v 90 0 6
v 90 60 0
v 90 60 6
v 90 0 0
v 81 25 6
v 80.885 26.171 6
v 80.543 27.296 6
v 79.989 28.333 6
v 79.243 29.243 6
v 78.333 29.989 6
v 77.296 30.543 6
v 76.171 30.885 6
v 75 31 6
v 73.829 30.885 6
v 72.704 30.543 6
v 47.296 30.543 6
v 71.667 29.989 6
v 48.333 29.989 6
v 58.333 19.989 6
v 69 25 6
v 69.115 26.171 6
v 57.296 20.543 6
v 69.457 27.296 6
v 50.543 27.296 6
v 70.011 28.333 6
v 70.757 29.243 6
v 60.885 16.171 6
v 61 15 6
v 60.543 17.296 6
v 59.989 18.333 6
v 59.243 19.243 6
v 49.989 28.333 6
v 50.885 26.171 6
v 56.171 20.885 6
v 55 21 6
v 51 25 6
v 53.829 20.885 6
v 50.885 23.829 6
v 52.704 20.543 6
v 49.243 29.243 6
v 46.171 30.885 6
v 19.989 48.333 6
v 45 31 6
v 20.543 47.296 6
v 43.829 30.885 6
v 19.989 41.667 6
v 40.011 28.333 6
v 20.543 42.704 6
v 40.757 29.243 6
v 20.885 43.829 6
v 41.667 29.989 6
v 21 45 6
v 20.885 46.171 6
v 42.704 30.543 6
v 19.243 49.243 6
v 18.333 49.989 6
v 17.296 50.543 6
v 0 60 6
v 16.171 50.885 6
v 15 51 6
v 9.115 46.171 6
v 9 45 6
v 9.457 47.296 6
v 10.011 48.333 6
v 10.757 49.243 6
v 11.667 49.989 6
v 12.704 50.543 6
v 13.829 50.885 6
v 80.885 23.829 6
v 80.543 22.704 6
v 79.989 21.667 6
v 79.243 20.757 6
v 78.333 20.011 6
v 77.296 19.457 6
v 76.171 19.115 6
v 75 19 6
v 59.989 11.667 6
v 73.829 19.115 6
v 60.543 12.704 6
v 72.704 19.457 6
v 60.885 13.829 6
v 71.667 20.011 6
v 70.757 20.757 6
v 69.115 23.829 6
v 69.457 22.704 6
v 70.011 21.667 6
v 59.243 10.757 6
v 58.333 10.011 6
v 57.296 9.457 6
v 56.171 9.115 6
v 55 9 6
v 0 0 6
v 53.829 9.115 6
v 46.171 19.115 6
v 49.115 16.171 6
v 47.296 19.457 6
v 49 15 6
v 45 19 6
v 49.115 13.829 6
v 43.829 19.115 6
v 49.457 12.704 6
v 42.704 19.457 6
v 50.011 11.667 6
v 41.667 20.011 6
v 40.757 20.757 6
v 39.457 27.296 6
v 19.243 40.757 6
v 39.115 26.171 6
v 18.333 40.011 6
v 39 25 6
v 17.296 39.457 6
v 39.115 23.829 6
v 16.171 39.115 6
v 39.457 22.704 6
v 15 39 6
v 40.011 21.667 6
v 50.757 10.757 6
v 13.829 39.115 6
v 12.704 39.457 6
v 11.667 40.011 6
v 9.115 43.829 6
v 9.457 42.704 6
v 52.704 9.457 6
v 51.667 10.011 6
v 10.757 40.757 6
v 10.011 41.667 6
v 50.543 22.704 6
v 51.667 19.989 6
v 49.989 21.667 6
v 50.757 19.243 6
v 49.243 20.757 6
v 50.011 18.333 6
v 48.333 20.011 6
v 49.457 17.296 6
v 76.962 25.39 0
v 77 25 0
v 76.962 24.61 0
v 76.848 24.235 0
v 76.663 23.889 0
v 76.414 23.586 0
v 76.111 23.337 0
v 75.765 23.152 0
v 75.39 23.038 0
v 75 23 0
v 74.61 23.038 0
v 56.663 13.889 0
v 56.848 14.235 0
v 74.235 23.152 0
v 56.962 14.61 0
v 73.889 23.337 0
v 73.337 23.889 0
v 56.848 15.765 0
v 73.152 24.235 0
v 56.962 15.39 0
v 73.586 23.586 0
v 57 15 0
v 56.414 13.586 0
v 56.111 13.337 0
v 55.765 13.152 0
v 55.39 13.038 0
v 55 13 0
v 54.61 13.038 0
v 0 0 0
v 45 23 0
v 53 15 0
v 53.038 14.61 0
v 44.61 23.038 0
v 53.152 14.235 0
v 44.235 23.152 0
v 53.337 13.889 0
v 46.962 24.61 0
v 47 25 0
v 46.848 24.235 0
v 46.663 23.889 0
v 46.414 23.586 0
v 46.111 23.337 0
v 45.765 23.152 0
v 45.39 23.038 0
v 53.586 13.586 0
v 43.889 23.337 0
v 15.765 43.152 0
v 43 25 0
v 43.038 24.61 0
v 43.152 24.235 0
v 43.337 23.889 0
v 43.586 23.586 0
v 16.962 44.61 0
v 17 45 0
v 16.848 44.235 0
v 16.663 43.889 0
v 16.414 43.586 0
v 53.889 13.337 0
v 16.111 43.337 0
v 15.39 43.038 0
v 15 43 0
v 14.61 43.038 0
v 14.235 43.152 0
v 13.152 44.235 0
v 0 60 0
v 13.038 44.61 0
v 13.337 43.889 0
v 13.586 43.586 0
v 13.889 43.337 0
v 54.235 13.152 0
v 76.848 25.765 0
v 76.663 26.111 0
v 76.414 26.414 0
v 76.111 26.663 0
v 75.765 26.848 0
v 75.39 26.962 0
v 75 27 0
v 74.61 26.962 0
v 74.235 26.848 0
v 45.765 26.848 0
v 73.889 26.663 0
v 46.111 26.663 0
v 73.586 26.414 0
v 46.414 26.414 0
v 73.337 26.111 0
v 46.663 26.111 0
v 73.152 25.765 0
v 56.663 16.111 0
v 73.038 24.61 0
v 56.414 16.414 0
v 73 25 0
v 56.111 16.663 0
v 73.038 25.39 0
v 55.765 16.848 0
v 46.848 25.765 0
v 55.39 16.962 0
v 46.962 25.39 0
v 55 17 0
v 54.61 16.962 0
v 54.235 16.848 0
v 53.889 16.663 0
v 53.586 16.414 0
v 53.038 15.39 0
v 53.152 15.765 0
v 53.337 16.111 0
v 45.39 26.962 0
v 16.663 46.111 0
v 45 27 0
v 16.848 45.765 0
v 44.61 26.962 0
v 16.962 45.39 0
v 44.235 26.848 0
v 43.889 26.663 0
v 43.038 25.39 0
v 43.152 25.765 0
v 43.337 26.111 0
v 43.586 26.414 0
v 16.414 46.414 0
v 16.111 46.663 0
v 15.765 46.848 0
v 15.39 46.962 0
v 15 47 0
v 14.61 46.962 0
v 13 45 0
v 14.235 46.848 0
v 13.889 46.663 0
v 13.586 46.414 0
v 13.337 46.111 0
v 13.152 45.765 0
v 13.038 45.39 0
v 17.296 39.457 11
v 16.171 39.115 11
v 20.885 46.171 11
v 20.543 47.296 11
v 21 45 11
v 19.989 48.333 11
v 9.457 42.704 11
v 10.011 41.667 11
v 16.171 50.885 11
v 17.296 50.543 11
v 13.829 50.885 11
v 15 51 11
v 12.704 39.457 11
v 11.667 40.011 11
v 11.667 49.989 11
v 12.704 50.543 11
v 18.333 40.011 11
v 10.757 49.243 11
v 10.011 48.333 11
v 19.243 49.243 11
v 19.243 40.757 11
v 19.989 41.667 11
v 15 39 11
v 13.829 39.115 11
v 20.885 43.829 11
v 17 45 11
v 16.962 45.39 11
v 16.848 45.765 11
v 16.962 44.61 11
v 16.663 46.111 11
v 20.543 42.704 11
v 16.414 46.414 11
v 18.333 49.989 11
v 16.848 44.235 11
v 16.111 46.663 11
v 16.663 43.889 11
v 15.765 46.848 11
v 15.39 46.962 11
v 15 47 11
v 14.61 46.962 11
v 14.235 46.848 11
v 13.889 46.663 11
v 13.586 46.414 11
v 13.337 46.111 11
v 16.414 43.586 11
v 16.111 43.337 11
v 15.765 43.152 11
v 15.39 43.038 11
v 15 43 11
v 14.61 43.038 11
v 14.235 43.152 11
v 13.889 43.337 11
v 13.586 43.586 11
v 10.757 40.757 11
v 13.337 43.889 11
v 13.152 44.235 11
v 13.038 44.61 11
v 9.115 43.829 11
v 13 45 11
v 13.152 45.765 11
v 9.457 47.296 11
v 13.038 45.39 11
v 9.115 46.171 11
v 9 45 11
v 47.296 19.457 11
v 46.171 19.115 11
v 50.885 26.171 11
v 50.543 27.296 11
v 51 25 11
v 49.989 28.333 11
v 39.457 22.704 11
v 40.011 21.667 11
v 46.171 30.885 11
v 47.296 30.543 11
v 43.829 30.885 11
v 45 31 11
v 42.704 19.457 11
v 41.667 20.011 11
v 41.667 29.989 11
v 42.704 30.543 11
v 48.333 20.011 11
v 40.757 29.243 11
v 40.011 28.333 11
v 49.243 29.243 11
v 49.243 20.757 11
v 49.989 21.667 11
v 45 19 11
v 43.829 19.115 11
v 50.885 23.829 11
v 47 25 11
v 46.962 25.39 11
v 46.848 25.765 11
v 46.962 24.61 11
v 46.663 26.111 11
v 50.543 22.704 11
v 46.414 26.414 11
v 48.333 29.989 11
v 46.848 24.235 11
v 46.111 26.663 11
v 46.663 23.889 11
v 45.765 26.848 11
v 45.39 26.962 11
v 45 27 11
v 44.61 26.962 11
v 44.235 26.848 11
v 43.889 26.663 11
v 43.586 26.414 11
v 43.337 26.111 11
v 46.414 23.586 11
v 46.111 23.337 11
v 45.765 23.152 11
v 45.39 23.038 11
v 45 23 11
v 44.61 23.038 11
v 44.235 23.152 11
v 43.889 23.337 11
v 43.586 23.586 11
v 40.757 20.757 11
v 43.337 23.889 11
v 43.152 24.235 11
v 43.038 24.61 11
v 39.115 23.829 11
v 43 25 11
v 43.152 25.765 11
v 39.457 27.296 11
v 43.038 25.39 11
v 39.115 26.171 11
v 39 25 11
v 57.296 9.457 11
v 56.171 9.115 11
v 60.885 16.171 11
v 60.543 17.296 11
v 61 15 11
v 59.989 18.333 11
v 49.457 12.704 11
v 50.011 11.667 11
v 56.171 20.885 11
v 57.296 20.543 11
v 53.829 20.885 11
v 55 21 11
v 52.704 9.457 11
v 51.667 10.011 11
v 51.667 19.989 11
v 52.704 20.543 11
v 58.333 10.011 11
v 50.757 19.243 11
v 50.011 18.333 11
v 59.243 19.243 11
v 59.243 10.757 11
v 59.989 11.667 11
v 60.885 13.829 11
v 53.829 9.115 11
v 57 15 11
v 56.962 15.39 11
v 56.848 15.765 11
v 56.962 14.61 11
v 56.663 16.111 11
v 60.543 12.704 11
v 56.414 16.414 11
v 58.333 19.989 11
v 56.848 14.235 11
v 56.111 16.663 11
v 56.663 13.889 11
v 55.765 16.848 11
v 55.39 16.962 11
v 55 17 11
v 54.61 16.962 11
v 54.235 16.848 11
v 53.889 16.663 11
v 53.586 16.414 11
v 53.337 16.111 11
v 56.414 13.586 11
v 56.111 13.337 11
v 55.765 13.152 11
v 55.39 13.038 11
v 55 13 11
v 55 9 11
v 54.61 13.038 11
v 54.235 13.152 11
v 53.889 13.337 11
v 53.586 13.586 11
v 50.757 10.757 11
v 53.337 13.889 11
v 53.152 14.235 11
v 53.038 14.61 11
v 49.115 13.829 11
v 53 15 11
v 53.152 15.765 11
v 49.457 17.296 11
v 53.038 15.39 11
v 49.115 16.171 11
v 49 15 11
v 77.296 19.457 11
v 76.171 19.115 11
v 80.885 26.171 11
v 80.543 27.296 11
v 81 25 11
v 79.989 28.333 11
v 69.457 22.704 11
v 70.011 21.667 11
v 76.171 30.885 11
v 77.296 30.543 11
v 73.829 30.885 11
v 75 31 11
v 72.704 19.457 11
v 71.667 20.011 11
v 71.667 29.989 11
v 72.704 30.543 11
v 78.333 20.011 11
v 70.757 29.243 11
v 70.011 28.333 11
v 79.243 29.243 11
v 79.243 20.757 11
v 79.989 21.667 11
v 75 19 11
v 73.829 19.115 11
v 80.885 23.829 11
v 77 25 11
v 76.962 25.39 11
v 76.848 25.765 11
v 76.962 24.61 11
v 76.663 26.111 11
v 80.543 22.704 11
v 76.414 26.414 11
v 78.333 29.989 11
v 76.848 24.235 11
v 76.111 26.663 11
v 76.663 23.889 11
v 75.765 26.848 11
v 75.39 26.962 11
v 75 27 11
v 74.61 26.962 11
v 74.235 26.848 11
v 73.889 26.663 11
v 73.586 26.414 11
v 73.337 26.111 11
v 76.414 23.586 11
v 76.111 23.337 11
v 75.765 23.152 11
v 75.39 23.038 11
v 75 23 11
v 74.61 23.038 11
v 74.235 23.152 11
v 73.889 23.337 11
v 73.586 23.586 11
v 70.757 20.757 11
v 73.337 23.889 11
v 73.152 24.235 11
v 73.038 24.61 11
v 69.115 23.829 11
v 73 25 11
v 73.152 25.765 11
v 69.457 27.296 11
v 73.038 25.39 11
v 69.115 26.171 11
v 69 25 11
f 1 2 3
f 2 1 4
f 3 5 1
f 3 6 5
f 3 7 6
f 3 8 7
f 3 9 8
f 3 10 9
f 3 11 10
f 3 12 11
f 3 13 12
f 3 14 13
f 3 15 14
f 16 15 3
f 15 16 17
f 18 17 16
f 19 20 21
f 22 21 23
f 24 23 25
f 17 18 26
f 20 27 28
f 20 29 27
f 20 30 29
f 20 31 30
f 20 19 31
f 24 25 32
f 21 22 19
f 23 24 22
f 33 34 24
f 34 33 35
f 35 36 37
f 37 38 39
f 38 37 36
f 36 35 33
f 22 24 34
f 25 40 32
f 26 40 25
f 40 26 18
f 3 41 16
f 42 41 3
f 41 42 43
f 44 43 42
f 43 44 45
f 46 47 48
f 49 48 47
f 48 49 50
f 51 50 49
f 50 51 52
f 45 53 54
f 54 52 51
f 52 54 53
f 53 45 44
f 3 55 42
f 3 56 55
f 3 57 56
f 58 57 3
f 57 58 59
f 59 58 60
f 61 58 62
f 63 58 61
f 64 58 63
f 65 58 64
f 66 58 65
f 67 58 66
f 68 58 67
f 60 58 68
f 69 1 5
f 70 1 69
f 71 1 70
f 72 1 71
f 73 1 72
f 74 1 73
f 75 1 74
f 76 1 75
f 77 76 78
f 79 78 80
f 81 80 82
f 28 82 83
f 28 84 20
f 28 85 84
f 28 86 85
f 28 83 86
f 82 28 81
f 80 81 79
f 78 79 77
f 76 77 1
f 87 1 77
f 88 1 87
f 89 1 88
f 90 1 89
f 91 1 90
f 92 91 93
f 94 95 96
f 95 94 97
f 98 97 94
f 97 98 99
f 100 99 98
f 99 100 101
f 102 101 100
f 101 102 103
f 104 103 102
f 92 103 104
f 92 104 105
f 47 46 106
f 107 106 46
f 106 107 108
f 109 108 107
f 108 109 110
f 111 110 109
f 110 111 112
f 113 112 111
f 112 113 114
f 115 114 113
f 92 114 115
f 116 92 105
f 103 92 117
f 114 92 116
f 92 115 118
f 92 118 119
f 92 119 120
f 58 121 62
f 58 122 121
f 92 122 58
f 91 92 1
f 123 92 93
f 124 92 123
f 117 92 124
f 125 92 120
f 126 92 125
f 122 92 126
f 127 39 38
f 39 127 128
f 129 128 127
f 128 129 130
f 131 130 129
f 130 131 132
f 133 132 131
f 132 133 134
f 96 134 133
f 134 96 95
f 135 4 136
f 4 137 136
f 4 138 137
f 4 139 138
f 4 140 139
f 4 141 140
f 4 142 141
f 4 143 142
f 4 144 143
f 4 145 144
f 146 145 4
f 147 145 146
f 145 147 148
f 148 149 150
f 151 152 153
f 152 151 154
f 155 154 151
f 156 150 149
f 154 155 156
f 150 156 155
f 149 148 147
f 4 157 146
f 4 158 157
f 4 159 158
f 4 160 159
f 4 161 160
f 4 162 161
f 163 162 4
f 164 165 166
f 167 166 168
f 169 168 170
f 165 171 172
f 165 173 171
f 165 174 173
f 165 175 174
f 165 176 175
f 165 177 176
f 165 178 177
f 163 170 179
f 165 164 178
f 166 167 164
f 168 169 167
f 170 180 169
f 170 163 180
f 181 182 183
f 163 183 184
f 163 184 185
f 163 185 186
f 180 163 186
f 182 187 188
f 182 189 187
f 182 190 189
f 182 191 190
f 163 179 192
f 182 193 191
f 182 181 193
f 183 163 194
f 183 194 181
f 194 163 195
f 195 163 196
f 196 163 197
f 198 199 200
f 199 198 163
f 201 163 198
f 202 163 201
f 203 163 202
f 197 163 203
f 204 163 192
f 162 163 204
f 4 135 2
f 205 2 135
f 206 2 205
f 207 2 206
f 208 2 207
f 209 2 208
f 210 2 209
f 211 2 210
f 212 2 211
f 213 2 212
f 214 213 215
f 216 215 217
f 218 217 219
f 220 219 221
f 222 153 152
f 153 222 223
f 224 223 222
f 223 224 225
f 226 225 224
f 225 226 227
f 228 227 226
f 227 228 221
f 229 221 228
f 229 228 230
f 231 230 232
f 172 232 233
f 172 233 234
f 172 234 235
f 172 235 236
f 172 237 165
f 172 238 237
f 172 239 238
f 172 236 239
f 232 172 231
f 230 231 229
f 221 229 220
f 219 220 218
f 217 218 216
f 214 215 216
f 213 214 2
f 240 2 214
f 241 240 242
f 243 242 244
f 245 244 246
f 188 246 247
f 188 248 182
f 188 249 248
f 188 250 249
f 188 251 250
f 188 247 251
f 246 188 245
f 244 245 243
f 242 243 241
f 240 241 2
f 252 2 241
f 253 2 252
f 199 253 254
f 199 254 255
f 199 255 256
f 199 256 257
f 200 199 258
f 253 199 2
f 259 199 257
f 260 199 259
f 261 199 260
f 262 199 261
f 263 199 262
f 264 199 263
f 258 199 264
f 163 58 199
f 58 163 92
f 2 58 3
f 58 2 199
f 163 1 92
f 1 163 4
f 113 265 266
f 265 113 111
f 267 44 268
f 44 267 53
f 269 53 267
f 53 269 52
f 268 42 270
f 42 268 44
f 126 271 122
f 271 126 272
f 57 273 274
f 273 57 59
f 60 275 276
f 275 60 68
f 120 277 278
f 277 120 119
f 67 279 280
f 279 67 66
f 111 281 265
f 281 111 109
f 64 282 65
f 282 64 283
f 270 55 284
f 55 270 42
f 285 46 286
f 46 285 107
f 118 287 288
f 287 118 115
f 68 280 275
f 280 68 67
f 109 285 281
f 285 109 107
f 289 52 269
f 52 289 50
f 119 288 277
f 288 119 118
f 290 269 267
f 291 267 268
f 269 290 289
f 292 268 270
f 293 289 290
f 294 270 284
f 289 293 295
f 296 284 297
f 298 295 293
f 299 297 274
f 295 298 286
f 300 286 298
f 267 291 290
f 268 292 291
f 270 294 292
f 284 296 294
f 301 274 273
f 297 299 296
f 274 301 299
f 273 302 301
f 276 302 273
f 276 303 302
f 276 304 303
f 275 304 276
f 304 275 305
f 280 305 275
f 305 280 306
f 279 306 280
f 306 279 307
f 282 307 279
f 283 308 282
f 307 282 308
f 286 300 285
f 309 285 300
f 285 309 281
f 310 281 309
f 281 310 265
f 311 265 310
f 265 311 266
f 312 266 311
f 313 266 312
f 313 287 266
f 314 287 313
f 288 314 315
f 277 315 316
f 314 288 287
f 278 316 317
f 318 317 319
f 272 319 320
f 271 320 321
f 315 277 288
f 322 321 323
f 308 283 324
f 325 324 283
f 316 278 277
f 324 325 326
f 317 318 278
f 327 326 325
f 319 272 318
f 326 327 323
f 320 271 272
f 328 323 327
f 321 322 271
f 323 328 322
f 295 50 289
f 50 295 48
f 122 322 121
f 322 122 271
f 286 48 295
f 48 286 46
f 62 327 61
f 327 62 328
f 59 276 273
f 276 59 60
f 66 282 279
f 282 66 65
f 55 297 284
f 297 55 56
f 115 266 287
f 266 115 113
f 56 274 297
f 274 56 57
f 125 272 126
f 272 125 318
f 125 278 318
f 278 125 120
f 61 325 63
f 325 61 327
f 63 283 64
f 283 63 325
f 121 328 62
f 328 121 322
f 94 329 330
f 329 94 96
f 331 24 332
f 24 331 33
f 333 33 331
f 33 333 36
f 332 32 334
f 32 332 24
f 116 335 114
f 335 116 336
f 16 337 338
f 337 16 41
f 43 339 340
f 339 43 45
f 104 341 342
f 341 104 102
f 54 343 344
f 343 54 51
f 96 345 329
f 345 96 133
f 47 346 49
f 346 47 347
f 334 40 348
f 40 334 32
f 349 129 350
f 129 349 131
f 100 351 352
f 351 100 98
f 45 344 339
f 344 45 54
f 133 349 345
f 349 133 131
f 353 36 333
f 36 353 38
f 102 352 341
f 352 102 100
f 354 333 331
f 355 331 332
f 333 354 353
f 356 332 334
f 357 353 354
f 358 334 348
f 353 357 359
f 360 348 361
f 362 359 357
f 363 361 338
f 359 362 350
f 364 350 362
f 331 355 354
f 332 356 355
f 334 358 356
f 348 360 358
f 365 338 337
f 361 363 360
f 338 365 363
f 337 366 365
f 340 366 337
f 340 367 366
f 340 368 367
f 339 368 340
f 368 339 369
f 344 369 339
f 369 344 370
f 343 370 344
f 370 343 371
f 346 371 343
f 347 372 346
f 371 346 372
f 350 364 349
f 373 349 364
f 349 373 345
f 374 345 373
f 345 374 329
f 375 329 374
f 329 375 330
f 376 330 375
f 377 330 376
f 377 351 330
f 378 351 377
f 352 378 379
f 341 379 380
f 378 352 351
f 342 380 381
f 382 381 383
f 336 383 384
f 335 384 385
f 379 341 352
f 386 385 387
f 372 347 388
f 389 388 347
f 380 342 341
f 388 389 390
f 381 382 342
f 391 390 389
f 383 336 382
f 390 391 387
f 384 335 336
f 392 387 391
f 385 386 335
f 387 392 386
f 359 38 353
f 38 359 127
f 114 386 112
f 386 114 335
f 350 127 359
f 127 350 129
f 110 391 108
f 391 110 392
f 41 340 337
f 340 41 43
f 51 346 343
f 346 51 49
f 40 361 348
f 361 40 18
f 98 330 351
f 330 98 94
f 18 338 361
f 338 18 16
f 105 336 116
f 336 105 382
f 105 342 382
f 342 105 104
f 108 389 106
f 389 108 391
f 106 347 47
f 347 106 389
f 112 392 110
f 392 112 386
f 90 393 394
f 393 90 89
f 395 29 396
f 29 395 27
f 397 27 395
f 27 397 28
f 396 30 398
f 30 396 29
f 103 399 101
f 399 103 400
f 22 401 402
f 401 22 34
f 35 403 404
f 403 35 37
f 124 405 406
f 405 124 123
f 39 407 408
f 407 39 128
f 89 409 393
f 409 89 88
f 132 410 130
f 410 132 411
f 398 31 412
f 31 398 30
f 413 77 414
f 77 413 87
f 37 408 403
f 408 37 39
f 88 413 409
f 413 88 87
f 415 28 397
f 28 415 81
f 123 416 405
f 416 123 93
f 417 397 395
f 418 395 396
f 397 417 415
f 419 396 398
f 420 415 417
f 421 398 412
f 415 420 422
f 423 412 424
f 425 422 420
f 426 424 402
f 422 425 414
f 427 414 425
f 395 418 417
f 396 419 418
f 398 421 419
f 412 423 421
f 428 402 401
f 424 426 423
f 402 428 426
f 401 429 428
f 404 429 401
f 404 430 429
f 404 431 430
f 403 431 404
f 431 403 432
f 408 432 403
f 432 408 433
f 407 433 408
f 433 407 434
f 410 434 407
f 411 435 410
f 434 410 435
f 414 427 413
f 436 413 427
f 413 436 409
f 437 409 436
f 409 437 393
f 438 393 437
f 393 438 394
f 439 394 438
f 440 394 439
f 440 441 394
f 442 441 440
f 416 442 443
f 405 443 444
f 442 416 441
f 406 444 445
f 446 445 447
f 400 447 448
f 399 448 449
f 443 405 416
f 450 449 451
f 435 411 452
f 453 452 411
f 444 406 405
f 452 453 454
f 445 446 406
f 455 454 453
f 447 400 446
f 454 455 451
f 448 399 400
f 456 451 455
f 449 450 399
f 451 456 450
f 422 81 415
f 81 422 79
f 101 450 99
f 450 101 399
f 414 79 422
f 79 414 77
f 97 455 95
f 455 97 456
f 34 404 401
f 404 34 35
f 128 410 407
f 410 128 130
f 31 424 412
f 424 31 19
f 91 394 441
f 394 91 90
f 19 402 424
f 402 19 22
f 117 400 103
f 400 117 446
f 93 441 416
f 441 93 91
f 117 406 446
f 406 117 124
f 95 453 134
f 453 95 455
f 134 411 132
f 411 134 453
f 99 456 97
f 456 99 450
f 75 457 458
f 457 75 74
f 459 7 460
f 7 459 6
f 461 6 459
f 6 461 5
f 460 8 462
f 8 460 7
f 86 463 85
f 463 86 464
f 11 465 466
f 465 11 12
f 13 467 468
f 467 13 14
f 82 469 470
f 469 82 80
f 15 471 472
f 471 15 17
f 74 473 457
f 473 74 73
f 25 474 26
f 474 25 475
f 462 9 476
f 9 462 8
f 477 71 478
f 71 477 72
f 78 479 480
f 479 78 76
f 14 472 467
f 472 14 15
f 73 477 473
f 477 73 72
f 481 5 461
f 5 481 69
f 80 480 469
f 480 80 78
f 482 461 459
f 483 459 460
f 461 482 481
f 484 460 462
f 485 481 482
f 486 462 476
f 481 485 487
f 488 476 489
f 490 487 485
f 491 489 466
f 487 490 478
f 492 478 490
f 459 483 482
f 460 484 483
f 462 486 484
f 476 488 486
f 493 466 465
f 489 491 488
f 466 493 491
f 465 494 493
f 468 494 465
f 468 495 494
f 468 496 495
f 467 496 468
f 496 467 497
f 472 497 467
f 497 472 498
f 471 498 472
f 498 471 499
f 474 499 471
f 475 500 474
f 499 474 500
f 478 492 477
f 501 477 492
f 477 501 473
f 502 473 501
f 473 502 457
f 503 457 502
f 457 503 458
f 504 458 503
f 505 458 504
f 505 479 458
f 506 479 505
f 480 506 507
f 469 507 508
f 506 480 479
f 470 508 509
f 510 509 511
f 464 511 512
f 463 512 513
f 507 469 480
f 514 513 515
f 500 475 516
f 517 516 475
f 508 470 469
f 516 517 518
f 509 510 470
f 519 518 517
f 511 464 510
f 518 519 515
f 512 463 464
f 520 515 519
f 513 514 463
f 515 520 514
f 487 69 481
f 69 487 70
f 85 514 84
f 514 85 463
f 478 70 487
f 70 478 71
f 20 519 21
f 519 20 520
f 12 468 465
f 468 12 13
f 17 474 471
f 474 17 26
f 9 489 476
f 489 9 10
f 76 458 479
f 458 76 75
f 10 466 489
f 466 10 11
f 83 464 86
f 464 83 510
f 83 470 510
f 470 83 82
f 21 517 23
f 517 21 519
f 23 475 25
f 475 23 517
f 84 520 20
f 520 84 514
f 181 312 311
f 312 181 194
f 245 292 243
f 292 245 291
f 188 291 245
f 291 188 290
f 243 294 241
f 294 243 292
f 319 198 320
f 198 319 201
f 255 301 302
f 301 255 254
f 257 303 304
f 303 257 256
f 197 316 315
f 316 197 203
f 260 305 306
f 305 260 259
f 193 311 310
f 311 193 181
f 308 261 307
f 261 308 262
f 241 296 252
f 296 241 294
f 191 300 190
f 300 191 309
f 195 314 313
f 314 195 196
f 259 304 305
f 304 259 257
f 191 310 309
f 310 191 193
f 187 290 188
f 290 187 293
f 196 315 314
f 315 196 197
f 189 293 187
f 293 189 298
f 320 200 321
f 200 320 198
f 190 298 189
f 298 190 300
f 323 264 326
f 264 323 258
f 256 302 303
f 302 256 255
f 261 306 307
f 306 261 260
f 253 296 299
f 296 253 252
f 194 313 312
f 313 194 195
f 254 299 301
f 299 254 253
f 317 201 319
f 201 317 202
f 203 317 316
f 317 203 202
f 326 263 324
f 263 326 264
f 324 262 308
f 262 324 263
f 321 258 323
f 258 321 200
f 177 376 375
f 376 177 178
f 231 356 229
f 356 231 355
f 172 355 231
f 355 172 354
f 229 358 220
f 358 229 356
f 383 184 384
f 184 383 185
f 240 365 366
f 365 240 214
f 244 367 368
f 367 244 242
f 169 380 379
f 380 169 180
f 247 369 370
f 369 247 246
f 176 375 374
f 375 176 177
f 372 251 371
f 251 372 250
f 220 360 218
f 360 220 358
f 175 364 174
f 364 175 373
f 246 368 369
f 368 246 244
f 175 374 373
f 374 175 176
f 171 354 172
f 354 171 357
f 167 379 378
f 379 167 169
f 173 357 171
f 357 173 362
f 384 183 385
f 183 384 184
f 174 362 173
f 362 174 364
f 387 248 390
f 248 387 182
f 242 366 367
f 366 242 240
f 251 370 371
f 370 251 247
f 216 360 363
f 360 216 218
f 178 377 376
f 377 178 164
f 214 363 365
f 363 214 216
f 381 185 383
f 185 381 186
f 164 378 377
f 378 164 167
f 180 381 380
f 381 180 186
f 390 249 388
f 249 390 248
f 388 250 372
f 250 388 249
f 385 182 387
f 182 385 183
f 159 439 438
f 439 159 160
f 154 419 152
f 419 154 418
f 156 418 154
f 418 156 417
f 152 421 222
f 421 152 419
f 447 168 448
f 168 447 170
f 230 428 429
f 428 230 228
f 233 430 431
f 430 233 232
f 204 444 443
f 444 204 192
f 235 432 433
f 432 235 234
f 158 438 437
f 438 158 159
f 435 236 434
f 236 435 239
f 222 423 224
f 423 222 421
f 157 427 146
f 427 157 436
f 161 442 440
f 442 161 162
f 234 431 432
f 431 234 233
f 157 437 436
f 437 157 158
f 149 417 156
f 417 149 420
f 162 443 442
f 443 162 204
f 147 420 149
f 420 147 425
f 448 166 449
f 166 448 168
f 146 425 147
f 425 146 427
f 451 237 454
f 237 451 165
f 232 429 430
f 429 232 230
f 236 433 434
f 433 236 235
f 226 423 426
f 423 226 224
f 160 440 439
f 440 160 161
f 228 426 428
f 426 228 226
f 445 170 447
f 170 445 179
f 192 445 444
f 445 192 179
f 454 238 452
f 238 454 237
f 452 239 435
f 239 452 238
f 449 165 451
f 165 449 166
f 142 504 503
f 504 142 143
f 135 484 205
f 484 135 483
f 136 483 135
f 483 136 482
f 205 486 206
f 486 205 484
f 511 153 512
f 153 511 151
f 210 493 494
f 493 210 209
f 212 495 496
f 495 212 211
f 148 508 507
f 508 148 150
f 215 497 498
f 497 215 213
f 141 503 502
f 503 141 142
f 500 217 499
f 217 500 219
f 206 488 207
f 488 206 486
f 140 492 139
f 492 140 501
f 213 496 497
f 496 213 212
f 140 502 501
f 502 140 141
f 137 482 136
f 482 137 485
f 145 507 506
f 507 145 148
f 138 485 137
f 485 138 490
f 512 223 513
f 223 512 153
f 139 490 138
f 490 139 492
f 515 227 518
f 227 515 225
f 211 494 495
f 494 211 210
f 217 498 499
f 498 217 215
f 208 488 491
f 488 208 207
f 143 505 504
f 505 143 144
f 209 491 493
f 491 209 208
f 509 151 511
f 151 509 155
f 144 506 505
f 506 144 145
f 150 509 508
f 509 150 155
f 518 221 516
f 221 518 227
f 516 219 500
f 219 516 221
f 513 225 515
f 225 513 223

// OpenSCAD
$fn = 32;

// ----------------------------------------------------------------------
// Boss field: plate with bosses at given coordinates
// ----------------------------------------------------------------------

// --- parameters (mm) ---
plate_l = 90;             // plate length, X
plate_w = 60;             // plate width, Y
plate_t = 6;              // plate thickness, Z
boss_d = 12;              // boss diameter
boss_h = 5;               // boss height above the plate
bore_d = 4;               // boss bore

total_h = plate_t + boss_h;  // overall height

difference() {
  union() {
    cube([plate_l, plate_w, plate_t]);
    translate([15, 45, plate_t]) cylinder(h = boss_h, d = boss_d);
    translate([45, 25, plate_t]) cylinder(h = boss_h, d = boss_d);
    translate([55, 15, plate_t]) cylinder(h = boss_h, d = boss_d);
    translate([75, 25, plate_t]) cylinder(h = boss_h, d = boss_d);
  }
  translate([15, 45, -1]) cylinder(h = total_h + 2, d = bore_d);
  translate([45, 25, -1]) cylinder(h = total_h + 2, d = bore_d);
  translate([55, 15, -1]) cylinder(h = total_h + 2, d = bore_d);
  translate([75, 25, -1]) cylinder(h = total_h + 2, d = bore_d);
}
